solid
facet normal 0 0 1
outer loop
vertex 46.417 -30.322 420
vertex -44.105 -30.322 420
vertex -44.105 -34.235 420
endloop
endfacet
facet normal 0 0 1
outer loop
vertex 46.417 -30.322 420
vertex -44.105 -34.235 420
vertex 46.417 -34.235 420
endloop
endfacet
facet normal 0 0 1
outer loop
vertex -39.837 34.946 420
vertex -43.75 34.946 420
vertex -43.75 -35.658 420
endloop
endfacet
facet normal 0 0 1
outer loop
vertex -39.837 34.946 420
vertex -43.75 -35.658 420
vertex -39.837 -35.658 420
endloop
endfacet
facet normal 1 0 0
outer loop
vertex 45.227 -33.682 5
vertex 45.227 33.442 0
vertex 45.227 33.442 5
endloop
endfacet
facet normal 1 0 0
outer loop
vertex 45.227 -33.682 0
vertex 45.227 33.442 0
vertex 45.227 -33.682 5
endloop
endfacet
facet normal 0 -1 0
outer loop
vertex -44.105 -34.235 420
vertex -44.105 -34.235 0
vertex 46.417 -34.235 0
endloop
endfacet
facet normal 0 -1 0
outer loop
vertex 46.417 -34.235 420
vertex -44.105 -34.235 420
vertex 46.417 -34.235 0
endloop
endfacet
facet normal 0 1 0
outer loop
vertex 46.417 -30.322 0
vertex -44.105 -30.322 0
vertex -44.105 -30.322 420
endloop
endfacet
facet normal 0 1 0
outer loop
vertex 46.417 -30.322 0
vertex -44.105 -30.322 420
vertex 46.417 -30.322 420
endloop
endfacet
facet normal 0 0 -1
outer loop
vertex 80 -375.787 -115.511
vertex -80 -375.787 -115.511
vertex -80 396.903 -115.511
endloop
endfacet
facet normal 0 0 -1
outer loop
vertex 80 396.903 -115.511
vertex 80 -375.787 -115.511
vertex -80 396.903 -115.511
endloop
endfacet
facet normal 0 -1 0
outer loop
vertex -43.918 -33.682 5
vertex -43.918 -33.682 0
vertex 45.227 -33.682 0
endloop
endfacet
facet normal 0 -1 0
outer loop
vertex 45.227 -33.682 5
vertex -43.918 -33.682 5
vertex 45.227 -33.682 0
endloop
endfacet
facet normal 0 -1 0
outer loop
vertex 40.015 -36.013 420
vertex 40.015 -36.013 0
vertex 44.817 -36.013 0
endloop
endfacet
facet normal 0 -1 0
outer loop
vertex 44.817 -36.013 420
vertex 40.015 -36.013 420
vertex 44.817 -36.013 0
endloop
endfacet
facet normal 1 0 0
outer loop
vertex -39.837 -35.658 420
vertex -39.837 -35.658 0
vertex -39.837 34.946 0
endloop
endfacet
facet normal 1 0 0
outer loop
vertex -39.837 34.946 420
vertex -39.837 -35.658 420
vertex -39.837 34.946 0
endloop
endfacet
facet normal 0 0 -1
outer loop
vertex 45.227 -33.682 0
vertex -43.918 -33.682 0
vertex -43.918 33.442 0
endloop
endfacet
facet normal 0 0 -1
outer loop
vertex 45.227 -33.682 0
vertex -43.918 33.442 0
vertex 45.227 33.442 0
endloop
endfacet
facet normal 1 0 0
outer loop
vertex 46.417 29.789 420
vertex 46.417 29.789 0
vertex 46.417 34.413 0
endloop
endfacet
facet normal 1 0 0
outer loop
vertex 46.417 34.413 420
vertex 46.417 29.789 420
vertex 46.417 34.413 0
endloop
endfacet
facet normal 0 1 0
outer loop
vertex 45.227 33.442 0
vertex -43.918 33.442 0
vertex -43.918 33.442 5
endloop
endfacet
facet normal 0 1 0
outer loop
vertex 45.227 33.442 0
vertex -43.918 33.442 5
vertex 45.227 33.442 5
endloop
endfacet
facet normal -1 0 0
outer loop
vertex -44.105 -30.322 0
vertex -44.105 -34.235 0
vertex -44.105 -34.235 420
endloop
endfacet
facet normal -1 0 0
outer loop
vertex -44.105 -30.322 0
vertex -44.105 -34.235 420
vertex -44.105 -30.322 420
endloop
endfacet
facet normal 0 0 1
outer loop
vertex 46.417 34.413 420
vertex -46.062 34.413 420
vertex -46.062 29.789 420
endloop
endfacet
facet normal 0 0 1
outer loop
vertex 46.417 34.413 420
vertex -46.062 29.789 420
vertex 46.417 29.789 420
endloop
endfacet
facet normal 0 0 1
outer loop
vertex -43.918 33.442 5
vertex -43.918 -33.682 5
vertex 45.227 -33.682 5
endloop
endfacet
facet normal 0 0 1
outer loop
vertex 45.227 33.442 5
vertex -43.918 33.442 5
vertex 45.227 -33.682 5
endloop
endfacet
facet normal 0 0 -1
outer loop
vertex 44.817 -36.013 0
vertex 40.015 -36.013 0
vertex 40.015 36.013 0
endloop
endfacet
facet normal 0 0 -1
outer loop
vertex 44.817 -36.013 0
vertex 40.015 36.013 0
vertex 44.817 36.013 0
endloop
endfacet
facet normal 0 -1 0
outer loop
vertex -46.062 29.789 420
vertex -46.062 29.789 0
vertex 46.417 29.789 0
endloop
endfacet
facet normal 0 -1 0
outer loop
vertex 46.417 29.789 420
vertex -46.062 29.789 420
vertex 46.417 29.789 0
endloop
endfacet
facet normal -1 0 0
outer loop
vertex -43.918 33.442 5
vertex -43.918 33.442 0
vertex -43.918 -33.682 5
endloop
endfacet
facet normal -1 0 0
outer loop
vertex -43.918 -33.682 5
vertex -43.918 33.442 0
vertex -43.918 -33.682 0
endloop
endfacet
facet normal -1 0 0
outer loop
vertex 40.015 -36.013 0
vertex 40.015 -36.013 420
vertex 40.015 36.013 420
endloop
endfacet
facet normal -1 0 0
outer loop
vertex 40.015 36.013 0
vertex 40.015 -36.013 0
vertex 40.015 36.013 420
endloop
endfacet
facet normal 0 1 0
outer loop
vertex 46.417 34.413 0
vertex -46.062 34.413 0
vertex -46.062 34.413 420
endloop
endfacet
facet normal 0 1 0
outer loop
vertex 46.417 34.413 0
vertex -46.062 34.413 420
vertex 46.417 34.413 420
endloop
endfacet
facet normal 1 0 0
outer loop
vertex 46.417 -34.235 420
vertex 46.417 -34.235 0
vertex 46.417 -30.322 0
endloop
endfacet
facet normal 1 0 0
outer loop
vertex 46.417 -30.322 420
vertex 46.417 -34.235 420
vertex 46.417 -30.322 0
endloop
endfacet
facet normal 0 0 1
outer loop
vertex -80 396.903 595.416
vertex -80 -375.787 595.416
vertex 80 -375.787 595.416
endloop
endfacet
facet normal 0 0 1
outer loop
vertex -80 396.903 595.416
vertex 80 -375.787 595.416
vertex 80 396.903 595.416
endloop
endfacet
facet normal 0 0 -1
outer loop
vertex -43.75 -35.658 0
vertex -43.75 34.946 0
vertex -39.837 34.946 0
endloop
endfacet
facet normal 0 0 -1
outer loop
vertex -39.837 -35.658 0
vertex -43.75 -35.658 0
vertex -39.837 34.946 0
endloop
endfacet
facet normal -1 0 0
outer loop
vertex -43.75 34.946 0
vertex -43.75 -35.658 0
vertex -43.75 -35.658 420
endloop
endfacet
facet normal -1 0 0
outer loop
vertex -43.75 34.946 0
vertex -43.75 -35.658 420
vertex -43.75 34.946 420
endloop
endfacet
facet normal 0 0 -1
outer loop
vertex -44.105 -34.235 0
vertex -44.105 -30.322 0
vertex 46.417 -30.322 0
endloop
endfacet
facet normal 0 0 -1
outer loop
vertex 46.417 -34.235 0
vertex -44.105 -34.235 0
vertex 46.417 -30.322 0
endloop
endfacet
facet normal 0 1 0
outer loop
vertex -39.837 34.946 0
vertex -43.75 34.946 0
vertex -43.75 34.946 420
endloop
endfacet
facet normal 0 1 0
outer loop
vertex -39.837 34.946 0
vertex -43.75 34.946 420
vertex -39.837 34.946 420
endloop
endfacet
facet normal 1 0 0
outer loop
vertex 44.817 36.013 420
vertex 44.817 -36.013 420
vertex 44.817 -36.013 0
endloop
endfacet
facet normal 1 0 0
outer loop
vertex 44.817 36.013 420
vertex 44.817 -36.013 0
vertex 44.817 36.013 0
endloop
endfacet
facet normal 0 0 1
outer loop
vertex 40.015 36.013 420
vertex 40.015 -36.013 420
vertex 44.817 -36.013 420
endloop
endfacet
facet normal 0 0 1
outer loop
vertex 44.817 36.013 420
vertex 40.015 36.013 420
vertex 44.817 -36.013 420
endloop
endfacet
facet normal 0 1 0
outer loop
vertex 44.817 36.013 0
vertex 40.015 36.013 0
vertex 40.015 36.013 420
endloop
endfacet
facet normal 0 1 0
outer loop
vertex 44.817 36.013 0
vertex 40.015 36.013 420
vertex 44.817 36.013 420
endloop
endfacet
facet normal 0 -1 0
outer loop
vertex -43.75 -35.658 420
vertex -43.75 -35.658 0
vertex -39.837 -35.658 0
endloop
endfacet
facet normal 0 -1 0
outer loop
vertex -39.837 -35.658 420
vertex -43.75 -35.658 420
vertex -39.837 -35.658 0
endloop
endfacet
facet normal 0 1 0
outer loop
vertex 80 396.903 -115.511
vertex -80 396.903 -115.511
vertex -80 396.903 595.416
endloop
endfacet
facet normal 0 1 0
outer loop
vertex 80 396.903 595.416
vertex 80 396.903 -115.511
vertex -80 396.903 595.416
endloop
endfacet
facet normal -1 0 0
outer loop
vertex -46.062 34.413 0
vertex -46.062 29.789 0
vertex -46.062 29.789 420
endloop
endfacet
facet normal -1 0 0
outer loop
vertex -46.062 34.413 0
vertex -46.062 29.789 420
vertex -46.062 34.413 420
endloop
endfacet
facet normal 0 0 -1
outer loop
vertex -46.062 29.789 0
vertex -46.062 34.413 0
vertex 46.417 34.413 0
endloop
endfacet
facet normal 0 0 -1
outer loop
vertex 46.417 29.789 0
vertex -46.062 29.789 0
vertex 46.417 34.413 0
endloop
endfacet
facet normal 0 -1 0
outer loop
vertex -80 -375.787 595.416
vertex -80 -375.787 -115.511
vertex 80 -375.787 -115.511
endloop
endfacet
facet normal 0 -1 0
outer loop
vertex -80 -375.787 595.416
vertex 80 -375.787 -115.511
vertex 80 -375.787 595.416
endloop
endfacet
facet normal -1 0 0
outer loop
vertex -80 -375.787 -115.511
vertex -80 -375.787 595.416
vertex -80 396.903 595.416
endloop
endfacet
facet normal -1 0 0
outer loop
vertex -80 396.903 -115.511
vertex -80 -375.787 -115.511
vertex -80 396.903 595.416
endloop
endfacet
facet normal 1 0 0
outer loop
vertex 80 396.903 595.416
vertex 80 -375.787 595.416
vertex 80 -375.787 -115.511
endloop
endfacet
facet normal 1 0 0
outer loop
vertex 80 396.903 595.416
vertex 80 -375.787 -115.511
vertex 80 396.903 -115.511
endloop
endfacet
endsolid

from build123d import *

# Parameters (mm, degrees)
SKETCH001_W      = 3.912567
SKETCH001_H      = 70.604042
EXTRUDE_DEPTH    = 420
SKETCH002_W      = 90.522564
SKETCH002_H      = 3.912567
EXTRUDE001_DEPTH = 420
SKETCH003_W      = 4.801788
SKETCH003_H      = 72.02679
EXTRUDE002_DEPTH = 420
SKETCH004_W      = 92.478852
SKETCH004_H      = 4.623944
EXTRUDE003_DEPTH = 420
SKETCH005_W      = 89.144947
SKETCH005_H      = 67.124008
EXTRUDE004_DEPTH = 5
SKETCH006_W      = 772.690033
SKETCH006_H      = 710.927407
EXTRUDE005_DEPTH = 160


with BuildPart() as extrude_body:
    # Sketch001 (on Sketch) → Extrude (new body)
    with BuildSketch(Plane.XY):
        with Locations((-41.793323, -0.355686)):
            Rectangle(SKETCH001_W, SKETCH001_H)
    extrude(amount=EXTRUDE_DEPTH)


with BuildPart() as extrude001:
    # Sketch002 (on Sketch) → Extrude001 (new body)
    with BuildSketch(Plane.XY):
        with Locations((1.155989, -32.278672)):
            Rectangle(SKETCH002_W, SKETCH002_H)
    extrude(amount=EXTRUDE001_DEPTH)


with BuildPart() as extrude002:
    # Sketch003 (on Sketch) → Extrude002 (new body)
    with BuildSketch(Plane.XY):
        with Locations((42.415775, -2e-06)):
            Rectangle(SKETCH003_W, SKETCH003_H)
    extrude(amount=EXTRUDE002_DEPTH)


with BuildPart() as extrude003:
    # Sketch004 (on Sketch) → Extrude003 (new body)
    with BuildSketch(Plane.XY):
        with Locations((0.177845, 32.100832)):
            Rectangle(SKETCH004_W, SKETCH004_H)
    extrude(amount=EXTRUDE003_DEPTH)


with BuildPart() as excitation:
    # Sketch005 (on Face5 of Extrude003) → Extrude004 (new body)
    with BuildSketch(Plane(origin=(0, 0, 0), x_dir=(1, 0, 0), z_dir=(0, 0, -1))):
        with Locations((0.654723, 0.120262)):
            Rectangle(SKETCH005_W, SKETCH005_H)
    extrude(amount=-EXTRUDE004_DEPTH)


with BuildPart() as simbox:
    # Sketch006 → Extrude005 (new body)
    with BuildSketch(Plane.YZ.offset(-80)):
        with Locations((10.557969, 239.952434)):
            Rectangle(SKETCH006_W, SKETCH006_H)
    extrude(amount=EXTRUDE005_DEPTH)


solid = Compound([extrude_body.part, extrude001.part, extrude002.part, extrude003.part, excitation.part, simbox.part])
